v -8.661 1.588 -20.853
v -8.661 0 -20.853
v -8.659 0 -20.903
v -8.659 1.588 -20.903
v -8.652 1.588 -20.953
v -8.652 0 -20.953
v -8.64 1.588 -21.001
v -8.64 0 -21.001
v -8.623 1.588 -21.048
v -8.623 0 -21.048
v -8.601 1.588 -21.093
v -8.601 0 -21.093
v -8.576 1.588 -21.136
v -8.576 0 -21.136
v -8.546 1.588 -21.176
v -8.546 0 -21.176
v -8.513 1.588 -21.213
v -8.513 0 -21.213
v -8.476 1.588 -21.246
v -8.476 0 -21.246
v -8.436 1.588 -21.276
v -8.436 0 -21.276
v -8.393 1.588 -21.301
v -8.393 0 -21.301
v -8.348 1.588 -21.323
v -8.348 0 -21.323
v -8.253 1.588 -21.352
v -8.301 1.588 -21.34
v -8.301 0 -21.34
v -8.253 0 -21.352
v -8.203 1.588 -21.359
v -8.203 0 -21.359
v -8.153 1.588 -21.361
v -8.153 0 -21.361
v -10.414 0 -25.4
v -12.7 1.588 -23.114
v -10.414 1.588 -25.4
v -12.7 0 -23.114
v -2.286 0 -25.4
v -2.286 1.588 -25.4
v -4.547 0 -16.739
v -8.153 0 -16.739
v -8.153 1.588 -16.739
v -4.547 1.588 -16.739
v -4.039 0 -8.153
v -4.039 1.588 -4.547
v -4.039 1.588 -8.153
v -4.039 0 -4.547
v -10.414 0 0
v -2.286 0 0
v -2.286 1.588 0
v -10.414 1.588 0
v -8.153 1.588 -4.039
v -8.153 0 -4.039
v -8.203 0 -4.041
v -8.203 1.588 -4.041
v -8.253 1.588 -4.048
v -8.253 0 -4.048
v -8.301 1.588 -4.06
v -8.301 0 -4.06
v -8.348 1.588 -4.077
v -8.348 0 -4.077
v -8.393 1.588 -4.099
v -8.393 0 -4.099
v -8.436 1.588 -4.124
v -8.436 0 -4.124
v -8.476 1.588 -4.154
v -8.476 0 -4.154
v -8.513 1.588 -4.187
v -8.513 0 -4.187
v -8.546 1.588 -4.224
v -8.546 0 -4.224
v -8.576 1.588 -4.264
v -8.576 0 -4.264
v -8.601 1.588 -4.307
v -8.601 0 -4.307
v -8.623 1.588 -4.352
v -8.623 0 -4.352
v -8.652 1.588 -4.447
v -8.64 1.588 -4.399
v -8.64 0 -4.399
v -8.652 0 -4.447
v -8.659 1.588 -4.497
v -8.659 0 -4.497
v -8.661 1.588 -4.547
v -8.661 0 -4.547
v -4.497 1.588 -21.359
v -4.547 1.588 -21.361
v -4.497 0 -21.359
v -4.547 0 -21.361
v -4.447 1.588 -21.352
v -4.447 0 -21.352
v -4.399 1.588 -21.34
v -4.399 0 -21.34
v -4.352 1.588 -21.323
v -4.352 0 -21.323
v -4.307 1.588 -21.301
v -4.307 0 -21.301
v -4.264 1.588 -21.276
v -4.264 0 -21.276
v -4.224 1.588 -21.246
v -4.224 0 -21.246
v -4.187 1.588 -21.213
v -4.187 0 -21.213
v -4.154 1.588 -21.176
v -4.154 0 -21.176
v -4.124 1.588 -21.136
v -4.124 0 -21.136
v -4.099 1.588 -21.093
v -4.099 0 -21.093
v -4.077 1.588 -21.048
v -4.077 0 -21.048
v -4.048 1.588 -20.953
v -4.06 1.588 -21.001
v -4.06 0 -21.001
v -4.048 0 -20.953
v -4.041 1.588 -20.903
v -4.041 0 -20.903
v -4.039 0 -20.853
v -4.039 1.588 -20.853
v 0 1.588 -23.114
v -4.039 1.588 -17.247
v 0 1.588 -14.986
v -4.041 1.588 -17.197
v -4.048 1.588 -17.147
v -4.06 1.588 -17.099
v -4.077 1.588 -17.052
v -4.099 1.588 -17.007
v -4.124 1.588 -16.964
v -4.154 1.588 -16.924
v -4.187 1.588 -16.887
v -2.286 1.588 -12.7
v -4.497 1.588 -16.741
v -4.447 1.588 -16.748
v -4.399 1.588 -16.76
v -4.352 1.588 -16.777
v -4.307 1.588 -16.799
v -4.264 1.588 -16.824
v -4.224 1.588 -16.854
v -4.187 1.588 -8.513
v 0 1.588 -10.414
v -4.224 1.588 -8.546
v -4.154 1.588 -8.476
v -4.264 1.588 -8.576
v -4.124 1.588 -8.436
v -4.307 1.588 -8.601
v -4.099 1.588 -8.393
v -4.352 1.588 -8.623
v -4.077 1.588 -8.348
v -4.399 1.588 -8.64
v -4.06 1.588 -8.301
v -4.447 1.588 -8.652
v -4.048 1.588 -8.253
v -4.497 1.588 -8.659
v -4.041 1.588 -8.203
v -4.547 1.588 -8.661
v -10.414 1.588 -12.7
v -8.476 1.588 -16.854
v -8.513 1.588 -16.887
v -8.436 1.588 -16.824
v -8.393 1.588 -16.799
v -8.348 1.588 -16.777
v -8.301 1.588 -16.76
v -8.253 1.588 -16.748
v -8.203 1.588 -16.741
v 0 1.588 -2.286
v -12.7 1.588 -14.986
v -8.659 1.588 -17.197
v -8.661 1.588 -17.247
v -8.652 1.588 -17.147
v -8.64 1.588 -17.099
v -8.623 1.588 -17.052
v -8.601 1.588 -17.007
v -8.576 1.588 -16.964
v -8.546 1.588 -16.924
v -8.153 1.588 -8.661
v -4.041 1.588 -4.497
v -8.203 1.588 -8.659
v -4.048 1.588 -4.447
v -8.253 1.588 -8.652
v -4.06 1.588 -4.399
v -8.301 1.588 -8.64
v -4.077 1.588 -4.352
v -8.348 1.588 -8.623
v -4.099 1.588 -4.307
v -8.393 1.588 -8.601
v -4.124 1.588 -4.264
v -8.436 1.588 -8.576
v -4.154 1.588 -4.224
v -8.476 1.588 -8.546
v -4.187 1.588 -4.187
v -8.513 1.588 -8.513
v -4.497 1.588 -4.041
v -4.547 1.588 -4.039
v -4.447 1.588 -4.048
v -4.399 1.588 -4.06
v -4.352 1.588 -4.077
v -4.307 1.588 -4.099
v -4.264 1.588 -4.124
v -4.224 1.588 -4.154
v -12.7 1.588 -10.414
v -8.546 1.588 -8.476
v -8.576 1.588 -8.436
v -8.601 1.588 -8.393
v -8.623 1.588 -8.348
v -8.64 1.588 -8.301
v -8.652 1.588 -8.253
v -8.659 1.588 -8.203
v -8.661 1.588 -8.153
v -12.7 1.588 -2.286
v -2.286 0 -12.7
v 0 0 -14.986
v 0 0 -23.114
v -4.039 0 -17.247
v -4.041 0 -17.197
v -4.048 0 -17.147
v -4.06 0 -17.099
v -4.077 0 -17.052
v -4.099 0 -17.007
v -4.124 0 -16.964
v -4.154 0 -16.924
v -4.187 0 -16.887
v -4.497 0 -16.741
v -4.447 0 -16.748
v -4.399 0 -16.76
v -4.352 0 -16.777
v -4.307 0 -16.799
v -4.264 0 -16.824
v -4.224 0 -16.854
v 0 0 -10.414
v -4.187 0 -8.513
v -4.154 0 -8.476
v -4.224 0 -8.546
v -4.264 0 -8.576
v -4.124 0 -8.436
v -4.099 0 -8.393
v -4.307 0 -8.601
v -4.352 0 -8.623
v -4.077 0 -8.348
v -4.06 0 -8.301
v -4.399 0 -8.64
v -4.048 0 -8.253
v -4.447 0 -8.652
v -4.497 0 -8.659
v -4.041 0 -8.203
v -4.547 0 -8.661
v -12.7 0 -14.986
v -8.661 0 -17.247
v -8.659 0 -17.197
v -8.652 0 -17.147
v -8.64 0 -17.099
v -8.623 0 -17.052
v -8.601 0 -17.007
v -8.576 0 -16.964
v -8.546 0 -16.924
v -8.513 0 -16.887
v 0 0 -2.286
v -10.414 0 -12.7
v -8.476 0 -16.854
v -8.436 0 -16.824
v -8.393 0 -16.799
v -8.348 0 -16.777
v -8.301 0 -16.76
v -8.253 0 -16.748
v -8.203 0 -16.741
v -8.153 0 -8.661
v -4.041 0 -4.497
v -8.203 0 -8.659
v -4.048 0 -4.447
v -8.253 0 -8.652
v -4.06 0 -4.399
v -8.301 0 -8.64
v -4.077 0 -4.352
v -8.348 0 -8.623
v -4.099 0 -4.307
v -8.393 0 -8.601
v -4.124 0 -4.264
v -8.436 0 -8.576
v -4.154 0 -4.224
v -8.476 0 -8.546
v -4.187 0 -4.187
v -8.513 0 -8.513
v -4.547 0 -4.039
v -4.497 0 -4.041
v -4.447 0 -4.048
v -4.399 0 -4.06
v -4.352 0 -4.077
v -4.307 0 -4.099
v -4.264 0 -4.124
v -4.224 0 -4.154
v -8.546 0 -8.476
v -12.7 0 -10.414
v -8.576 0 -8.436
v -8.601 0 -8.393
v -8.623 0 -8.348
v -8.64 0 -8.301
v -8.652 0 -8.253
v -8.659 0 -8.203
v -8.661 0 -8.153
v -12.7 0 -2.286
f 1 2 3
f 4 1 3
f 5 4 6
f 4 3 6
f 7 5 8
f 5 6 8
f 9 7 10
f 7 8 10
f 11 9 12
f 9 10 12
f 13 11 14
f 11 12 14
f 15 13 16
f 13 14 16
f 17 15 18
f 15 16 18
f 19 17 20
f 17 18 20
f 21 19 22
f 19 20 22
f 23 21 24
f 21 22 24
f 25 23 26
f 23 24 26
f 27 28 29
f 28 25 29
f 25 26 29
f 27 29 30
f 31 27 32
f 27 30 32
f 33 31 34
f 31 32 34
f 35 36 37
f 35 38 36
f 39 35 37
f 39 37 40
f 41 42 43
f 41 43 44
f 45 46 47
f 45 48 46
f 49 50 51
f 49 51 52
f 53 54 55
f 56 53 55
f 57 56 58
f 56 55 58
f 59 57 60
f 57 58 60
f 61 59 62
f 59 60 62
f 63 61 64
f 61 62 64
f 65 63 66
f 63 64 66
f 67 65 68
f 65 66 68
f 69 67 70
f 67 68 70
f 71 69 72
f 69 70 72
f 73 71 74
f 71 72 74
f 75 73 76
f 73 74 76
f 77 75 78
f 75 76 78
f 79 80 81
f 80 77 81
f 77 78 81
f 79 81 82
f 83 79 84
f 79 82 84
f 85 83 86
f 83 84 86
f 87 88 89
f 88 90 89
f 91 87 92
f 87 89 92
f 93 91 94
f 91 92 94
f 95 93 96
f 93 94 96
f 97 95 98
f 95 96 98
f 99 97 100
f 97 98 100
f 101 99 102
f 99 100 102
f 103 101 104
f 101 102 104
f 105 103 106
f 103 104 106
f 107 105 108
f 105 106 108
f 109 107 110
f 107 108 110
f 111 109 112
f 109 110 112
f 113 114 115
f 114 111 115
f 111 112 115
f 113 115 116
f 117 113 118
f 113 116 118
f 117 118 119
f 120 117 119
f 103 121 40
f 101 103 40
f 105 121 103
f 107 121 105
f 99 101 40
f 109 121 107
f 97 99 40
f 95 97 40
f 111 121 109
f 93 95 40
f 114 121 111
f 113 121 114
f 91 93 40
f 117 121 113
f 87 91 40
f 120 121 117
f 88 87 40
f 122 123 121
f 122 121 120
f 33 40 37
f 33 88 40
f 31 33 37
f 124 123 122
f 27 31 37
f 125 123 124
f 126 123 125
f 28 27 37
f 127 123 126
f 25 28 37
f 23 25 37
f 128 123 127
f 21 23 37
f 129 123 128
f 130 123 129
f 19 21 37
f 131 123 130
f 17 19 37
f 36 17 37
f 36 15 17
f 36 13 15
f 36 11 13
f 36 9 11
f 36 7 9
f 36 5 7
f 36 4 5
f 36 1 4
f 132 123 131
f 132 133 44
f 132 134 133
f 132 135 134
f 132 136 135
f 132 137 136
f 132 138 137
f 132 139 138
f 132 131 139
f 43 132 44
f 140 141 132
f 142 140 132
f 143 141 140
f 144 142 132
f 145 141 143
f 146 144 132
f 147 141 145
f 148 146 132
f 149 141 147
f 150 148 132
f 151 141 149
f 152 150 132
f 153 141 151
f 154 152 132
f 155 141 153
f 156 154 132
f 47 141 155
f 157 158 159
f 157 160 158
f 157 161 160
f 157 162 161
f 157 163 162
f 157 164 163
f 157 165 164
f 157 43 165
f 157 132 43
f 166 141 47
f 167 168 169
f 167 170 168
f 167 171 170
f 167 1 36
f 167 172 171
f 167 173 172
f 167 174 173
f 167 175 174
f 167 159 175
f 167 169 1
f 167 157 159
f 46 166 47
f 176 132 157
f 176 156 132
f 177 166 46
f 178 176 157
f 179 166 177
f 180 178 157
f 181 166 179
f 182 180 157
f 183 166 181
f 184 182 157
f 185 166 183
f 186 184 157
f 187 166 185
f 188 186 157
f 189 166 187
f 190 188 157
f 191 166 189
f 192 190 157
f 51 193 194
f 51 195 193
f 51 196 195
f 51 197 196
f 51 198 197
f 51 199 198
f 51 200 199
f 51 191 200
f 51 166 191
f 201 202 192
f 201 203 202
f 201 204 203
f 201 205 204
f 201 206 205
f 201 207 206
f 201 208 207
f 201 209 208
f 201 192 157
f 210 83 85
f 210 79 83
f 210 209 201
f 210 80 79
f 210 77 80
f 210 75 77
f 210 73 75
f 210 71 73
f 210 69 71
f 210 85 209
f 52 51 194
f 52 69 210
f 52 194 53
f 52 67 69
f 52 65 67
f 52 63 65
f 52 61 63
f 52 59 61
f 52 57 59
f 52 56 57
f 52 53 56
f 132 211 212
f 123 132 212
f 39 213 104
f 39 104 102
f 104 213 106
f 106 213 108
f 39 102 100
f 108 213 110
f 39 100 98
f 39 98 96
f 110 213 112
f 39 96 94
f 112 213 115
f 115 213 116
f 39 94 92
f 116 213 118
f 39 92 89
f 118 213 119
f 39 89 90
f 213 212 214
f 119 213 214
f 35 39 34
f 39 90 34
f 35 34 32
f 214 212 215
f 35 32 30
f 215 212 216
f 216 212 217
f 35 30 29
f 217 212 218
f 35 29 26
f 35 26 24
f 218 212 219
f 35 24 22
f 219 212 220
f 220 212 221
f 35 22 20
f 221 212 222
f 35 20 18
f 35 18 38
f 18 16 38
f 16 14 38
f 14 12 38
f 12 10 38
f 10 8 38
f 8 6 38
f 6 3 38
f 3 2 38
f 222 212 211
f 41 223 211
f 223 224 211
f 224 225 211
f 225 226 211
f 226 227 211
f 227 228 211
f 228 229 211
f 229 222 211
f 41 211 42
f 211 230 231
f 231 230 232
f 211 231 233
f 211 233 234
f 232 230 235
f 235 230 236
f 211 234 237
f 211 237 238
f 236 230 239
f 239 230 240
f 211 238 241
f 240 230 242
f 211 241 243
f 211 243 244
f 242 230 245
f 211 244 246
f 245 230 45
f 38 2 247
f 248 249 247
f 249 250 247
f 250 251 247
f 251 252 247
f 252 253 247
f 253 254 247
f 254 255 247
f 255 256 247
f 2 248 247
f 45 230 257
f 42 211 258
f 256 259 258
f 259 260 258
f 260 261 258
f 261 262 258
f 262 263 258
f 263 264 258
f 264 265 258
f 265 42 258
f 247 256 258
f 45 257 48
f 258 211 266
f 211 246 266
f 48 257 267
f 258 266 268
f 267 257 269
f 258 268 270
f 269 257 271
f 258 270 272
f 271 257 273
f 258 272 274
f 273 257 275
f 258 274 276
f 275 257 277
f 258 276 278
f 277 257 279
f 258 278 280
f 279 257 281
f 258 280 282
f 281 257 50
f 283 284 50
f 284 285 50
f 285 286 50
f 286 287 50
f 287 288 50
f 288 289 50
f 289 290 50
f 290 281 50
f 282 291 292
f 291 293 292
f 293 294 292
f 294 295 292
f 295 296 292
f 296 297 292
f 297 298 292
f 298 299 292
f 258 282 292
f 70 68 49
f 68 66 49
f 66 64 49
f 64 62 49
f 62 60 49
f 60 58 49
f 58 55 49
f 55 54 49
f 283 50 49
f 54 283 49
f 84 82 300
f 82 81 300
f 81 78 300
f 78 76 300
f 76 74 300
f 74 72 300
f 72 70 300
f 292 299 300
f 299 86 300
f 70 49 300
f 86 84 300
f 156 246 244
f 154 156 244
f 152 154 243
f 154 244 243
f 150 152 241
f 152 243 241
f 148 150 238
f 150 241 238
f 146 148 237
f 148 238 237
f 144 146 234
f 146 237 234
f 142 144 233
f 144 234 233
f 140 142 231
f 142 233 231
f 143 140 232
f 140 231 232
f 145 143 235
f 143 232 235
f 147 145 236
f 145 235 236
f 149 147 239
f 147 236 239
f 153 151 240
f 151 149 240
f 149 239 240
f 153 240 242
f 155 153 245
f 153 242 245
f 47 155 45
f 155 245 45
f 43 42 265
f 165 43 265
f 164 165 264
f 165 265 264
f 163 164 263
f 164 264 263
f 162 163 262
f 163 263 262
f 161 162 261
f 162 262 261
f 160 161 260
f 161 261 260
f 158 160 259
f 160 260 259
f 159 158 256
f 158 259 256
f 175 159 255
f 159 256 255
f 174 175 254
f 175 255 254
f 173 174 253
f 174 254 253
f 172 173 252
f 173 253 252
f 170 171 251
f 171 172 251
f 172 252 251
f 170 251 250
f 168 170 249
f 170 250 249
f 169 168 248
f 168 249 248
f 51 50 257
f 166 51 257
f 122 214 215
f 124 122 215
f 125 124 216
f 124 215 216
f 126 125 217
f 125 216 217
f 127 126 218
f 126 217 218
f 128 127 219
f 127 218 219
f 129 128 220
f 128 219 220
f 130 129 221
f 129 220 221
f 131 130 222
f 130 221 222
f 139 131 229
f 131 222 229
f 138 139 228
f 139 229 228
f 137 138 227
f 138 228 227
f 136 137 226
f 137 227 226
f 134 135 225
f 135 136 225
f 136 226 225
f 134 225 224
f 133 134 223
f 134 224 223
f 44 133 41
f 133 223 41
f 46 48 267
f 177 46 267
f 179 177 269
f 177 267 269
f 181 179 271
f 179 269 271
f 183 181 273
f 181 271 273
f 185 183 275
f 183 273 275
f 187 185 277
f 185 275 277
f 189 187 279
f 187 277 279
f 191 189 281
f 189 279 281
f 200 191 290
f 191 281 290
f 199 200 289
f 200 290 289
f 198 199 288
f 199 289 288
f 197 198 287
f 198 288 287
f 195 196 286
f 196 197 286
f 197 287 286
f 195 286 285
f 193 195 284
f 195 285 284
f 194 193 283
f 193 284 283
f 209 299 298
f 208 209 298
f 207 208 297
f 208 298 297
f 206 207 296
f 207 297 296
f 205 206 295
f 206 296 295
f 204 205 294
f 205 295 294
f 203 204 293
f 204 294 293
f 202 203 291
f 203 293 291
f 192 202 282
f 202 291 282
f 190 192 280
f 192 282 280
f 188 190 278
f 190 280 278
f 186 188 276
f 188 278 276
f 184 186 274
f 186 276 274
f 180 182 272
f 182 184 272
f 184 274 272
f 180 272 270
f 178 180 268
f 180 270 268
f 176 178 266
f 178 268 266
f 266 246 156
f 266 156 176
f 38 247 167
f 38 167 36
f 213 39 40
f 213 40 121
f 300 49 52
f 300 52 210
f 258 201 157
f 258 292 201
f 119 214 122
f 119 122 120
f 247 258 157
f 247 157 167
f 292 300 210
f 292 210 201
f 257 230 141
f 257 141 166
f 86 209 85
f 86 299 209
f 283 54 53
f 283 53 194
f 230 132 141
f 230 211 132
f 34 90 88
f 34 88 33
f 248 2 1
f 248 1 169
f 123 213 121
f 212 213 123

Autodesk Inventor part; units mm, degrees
ref_plane "YZ Plane" through (0, 0, 0) normal (1, 0, 0) x (0, 1, 0)
ref_plane "XZ Plane" through (0, 0, 0) normal (0, 1, 0) x (-1, 0, 0)
ref_plane "XY Plane" through (0, 0, 0) normal (0, 0, 1) x (1, 0, 0)
sketch "Sketch1" plane through (0, 0, 0) normal (0, 1, 0) x (-1, 0, 0)
  line L0 (2.286, 0) -> (10.414, 0)
  line L1 (12.7, -2.286) -> (12.7, -10.414)
  line L2 (10.414, -12.7) -> (2.286, -12.7)
  line L3 (0, -10.414) -> (0, -2.286)
  line L4 (8.1534, -4.0386) -> (4.5466, -4.0386)
  line L5 (4.0386, -4.5466) -> (4.0386, -8.1534)
  line L6 (4.5466, -8.6614) -> (8.1534, -8.6614)
  line L7 (8.6614, -8.1534) -> (8.6614, -4.5466)
  line L8 (10.414, 0) -> (12.7, -2.286)
  line L9 (12.7, -10.414) -> (10.414, -12.7)
  line L10 (2.286, -12.7) -> (0, -10.414)
  line L11 (2.286, 0) -> (0, -2.286)
  arc A0 (8.6614, -4.5466) -> (8.1534, -4.0386) centre (8.1534, -4.5466) ccw
  arc A1 (8.1534, -8.6614) -> (8.6614, -8.1534) centre (8.1534, -8.1534) ccw
  arc A2 (4.0386, -8.1534) -> (4.5466, -8.6614) centre (4.5466, -8.1534) ccw
  arc A3 (4.5466, -4.0386) -> (4.0386, -4.5466) centre (4.5466, -4.5466) ccw
  line L12 (8.1534, -4.5466) -> (4.5466, -8.1534) construction
  line L13 (12.7, -10.414) -> (0, -2.286) construction
  point P0 (0, 0)
  point P1 (12.7, -12.7)
  point P2 (12.7, 0)
  point P3 (0, -12.7)
  point P4 (4.0386, -8.6614)
  point P5 (8.6614, -8.6614)
  point P6 (6.35, -6.35)
  dimension "d1" = 12.7
  dimension "d2" = 4.6228
  dimension "d3" = 2.286
  dimension "d4" = 2.286
  dimension "d5" = 2.286
  dimension "d6" = 2.286
  dimension "d7" = 2.286
  dimension "d8" = 2.286
  dimension "d9" = 2.286
  dimension "d10" = 2.286
  dimension "d11" = 0.508
extrude "Body" add sketch "Sketch1" along normal blind 1.5875
sketch "Sketch2" plane through (0, 1.5875, 0) normal (0, 1, 0) x (1, 0, 0)
  arc A0 (-8.1534, 8.6614) -> (-8.6614, 8.1534) centre (-8.1534, 8.1534) ccw construction
  arc A1 (-4.5466, 4.0386) -> (-4.0386, 4.5466) centre (-4.5466, 4.5466) ccw construction
  circle A2 centre (-6.35, 6.35) radius 2.1844
  line L0 (-8.1534, 8.1534) -> (-4.5466, 4.5466) construction
  point P0 (0, 0)
  dimension "d14" = 4.3688
surface extrude "Circle" sketch "Sketch2" against normal up to surface (1.5875 mm away) shown yes curves A2
pattern_linear "Rectangular Pattern1" count 2 spacing 12.7 along (0, 0, -1) of "Body", "Circle"
equation "\"d4\" = d3"
equation "\"d5\" = d3"
equation "\"d6\" = d5"
equation "\"d7\" = d3"
equation "\"d8\" = d7"
equation "\"d9\" = d3"
equation "\"d10\" = d9"
equation "\"d22\" = d19"
equation "\"d19\" = 12.7"
